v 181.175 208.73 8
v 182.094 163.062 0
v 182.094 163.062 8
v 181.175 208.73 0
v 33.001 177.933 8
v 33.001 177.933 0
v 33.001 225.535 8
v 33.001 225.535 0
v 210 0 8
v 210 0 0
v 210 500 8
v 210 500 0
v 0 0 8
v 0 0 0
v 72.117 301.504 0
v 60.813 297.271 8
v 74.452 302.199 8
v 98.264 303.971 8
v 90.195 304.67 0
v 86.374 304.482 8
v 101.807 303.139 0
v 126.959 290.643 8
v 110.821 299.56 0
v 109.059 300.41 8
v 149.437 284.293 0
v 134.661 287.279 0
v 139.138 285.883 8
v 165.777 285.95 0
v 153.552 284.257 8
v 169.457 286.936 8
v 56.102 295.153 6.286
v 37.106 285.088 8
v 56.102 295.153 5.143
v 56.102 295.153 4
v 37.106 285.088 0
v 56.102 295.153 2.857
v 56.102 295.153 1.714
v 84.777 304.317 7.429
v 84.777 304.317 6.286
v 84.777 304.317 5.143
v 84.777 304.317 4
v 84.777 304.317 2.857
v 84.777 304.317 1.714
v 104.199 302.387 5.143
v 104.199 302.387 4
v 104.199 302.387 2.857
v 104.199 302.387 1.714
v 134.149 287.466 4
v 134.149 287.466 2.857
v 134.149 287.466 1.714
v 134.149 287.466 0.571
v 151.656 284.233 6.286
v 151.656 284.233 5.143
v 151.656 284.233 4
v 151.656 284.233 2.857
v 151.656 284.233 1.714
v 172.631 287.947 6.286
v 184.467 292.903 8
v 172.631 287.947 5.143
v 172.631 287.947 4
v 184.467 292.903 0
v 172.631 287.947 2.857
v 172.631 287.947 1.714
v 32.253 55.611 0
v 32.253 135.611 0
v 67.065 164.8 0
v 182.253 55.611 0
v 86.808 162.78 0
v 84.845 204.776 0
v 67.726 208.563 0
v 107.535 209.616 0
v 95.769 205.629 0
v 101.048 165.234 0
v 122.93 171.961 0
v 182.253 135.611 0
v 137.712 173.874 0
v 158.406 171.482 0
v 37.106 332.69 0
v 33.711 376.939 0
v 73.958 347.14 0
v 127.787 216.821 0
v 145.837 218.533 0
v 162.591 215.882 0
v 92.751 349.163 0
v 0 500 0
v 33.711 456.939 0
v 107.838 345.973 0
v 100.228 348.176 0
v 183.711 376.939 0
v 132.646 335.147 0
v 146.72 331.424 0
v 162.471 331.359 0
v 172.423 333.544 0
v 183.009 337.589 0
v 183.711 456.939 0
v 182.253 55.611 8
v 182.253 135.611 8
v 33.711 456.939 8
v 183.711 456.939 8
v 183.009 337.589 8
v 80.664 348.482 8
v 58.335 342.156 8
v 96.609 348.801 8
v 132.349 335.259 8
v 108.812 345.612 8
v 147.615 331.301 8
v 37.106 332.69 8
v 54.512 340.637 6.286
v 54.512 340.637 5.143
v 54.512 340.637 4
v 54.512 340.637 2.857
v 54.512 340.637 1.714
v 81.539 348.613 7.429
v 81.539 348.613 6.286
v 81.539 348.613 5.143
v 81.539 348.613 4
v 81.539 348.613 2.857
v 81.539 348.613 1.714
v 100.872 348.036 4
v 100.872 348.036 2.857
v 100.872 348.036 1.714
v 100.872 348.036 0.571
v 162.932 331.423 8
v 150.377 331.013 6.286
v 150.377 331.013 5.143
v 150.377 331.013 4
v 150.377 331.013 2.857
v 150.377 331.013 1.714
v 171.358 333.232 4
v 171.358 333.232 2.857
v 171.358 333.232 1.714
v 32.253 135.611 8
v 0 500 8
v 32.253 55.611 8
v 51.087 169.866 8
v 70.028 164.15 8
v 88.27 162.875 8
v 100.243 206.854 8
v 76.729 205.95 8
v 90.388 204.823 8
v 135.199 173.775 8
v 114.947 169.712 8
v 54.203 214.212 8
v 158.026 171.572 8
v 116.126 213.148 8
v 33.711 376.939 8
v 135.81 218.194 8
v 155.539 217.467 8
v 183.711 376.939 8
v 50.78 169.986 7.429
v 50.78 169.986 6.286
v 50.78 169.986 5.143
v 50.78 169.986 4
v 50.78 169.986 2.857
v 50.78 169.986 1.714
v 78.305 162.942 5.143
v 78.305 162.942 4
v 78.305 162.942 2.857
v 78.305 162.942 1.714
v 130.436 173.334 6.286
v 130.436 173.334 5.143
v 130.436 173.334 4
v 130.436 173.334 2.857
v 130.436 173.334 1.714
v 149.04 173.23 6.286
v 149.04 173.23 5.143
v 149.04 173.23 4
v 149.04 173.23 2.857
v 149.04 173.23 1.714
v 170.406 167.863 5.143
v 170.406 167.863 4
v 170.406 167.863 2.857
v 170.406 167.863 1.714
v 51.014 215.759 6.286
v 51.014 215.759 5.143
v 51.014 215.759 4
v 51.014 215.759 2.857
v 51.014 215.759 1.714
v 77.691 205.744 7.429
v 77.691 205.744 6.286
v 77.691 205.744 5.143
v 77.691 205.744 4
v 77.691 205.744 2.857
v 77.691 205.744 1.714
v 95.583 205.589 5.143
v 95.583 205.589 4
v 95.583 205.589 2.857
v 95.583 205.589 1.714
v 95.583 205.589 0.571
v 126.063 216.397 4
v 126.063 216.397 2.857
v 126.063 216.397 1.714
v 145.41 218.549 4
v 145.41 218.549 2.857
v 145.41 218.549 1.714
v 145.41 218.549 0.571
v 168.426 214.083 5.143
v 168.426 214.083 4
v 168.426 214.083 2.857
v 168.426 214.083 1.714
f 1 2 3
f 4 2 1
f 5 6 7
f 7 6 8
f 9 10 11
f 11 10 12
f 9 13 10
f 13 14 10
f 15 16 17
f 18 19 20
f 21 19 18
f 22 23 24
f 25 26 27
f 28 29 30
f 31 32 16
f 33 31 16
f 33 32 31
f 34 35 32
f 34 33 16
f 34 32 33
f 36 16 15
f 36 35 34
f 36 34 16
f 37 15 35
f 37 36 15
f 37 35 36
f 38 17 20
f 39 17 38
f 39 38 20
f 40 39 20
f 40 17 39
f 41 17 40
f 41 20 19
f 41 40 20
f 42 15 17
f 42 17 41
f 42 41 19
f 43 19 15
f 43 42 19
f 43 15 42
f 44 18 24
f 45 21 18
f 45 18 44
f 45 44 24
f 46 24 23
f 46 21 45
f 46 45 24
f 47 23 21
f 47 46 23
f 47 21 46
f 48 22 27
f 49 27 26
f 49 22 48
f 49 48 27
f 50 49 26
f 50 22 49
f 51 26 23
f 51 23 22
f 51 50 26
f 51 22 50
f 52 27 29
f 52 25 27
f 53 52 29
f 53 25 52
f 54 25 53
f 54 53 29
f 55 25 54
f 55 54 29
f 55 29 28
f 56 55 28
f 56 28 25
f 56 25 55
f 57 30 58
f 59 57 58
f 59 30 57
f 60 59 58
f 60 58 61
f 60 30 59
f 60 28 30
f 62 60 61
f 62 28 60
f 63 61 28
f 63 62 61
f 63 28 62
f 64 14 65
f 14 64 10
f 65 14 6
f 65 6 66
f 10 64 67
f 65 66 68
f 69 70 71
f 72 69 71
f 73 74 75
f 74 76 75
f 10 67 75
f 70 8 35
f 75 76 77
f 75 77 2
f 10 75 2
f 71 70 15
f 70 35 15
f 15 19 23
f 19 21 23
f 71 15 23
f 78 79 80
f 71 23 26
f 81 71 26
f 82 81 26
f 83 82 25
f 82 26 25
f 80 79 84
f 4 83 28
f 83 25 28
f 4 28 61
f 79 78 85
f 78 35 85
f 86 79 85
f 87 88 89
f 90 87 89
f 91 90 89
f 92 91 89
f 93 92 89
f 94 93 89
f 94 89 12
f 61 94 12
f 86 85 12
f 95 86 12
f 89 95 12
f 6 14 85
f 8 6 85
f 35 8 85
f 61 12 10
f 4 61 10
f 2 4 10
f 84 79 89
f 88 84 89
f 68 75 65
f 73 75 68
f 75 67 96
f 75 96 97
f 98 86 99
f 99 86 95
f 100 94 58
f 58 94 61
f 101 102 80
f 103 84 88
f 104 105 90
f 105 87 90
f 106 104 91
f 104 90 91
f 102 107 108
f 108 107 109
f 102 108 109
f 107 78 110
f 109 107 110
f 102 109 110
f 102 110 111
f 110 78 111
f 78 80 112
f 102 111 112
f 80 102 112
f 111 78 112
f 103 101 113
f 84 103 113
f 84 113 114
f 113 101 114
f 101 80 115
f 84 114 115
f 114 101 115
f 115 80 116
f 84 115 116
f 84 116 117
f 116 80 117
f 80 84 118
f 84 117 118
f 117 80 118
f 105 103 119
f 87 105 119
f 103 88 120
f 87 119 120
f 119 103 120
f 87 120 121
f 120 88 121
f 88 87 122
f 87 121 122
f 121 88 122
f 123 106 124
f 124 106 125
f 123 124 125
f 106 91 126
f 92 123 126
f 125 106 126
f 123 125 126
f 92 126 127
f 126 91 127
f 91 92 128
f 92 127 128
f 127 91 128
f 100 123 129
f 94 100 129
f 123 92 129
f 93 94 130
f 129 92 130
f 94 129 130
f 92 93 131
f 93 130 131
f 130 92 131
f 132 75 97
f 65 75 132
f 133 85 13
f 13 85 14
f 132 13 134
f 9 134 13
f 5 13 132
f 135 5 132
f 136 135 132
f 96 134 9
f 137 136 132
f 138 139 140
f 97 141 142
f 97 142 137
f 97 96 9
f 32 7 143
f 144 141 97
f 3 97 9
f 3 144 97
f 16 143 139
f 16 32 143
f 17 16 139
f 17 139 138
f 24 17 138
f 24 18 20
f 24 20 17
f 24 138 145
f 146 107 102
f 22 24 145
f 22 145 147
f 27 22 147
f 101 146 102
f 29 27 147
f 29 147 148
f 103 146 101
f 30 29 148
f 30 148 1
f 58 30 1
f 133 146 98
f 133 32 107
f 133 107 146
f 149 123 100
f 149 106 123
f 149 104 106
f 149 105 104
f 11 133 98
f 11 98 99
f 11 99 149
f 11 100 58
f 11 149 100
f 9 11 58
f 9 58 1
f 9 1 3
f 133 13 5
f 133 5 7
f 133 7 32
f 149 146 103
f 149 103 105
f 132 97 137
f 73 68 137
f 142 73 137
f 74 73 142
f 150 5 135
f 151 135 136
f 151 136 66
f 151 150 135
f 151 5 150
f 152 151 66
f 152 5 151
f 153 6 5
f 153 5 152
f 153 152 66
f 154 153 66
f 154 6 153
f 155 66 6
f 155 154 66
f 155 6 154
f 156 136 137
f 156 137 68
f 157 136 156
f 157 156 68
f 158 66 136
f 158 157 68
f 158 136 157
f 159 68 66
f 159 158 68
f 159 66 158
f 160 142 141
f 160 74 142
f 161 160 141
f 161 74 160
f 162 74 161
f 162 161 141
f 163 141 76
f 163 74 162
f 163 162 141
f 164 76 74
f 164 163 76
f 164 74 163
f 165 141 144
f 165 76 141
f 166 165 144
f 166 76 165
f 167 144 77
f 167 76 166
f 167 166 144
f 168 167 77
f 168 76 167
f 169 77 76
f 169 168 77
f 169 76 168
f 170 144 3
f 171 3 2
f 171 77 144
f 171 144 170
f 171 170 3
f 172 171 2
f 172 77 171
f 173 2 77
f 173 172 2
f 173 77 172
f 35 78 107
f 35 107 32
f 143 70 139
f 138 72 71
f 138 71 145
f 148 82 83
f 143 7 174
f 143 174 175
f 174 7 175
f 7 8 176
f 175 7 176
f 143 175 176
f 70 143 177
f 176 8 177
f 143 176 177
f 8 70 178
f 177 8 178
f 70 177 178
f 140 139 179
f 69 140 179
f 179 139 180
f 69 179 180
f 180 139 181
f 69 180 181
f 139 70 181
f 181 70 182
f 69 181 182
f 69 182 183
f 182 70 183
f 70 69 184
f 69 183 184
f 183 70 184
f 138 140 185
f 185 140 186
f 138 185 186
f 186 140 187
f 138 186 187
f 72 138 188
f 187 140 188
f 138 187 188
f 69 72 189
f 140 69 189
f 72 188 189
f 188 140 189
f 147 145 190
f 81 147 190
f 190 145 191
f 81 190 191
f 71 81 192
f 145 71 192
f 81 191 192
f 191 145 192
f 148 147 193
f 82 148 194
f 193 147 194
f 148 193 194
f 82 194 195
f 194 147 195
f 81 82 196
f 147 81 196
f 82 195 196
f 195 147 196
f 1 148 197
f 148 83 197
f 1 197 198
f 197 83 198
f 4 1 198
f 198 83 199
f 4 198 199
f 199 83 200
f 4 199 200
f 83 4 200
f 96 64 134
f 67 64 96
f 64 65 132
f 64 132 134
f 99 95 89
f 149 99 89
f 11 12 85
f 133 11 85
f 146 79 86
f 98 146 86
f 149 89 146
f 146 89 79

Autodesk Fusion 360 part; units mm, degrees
sketch "Sketch1" plane through (0, 0, 0) normal (0, 0, 1) x (1, 0, 0)
  line L0 (0, 500) -> (0, 0)
  line L1 (0, 0) -> (210, 0)
  line L2 (210, 0) -> (210, 500)
  line L3 (210, 500) -> (0, 500)
  line L4 (210, 0) -> (210, 500)
  line L5 (420, 500) -> (420, 0)
  line L6 (210, 500) -> (420, 500)
  line L7 (420, 0) -> (210, 0)
  point P0 (420, 0)
  dimension "d1" = 210
  dimension "d2" = 500
sketch "Sketch2" plane through (0, 0, 0) normal (0, 0, 1) x (1, 0, 0)
  line L0 (33.711, 456.9389) -> (183.711, 456.9389)
  line L1 (183.711, 456.9389) -> (183.711, 376.9389)
  line L2 (183.711, 376.9389) -> (33.711, 376.9389)
  line L3 (33.711, 376.9389) -> (33.711, 456.9389)
  line L4 (210, 0) -> (210, 500)
  line L5 (236.289, 456.9389) -> (236.289, 376.9389)
  line L6 (236.289, 376.9389) -> (386.289, 376.9389)
  line L7 (386.289, 456.9389) -> (236.289, 456.9389)
  line L8 (386.289, 376.9389) -> (386.289, 456.9389)
  dimension "d5" = 80
  dimension "d6" = 150
sketch "Sketch3" plane through (0, 0, 0) normal (0, 0, 1) x (1, 0, 0)
  line L0 (32.2529, 55.6107) -> (182.2529, 55.6107)
  line L1 (182.2529, 55.6107) -> (182.2529, 135.6107)
  line L2 (182.2529, 135.6107) -> (32.2529, 135.6107)
  line L3 (32.2529, 135.6107) -> (32.2529, 55.6107)
  line L4 (210, 0) -> (210, 500)
  line L5 (237.7471, 55.6107) -> (237.7471, 135.6107)
  line L6 (387.7471, 135.6107) -> (387.7471, 55.6107)
  line L7 (237.7471, 135.6107) -> (387.7471, 135.6107)
  line L8 (387.7471, 55.6107) -> (237.7471, 55.6107)
  dimension "d3" = 80
  dimension "d4" = 150
sketch "Sketch4" plane through (0, 0, 0) normal (0, 0, 1) x (1, 0, 0)
  spline S0 degree 5 poles (37.1063, 332.6897) (42.3749, 335.3073) (52.3549, 339.9904) (65.6542, 345.3585) (80.2569, 349.3524) (94.455, 349.9181) (106.0588, 347.1834) (116.552, 342.4363) (127.2275, 337.0505) (138.9022, 332.4525) (151.9574, 330.0384) (163.6176, 330.8449) (173.049, 333.408) (179.6386, 336.0413) (183.0089, 337.5891) knots 0 0 0 0 0 0 0.1 0.2 0.3 0.4 0.5 0.6 0.7 0.8 0.9 1 1 1 1 1 1
  line L0 (12.8551, 320.6405) -> (61.3576, 344.7389)
  spline S1 degree 5 poles (37.1063, 285.0878) (42.8971, 288.4586) (53.8131, 294.4211) (68.19, 301.0281) (83.6155, 305.4358) (98.026, 305.1198) (109.2899, 300.9209) (119.1641, 294.9006) (129.1906, 289.0058) (140.3665, 284.7869) (153.15, 283.3608) (164.7942, 285.1007) (174.3242, 288.2578) (181.0276, 291.2129) (184.4668, 292.9031) knots 0 0 0 0 0 0 0.1 0.2 0.3 0.4 0.5 0.6 0.7 0.8 0.9 1 1 1 1 1 1
  line L1 (11.3971, 270.1228) -> (62.8155, 300.0529)
  line L2 (183.0089, 337.5891) -> (184.4668, 292.9031)
  line L3 (37.1063, 332.6897) -> (37.1063, 285.0878)
  spline S2 degree 5 poles (33.001, 177.9329) (38.3874, 175.2566) (48.5839, 170.5407) (62.1501, 165.3764) (77.0074, 162.0547) (91.4293, 162.4372) (103.2499, 165.5685) (114.0265, 169.6123) (125.0886, 172.9374) (137.2166, 174.4629) (150.704, 173.6089) (162.6105, 170.7864) (172.1303, 167.4148) (178.7303, 164.6061) (182.0937, 163.0615) knots 0 0 0 0 0 0 0.1 0.2 0.3 0.4 0.5 0.6 0.7 0.8 0.9 1 1 1 1 1 1
  line L4 (165.4289, 329.5156) -> (200.5889, 345.6626)
  line L5 (8.7497, 189.9821) -> (57.2522, 165.8837)
  line L6 (164.5136, 171.135) -> (199.6737, 154.988)
  line L7 (33.001, 177.9329) -> (33.001, 225.5347)
  spline S3 degree 5 poles (33.001, 225.5347) (38.5243, 222.3196) (48.8936, 216.5629) (62.4155, 209.9478) (76.6735, 204.9492) (89.8078, 203.8525) (100.2443, 206.3287) (109.9563, 210.6694) (120.5592, 215.2082) (132.869, 218.4944) (147.0982, 219.3055) (159.9368, 217.1832) (170.2893, 213.7191) (177.4957, 210.5385) (181.175, 208.7303) knots 0 0 0 0 0 0 0.1 0.2 0.3 0.4 0.5 0.6 0.7 0.8 0.9 1 1 1 1 1 1
  line L8 (166.2067, 283.9293) -> (202.727, 301.8769)
  line L9 (7.2917, 240.4998) -> (58.7102, 210.5696)
  line L10 (162.9149, 217.7041) -> (199.4352, 199.7565)
  line L11 (182.0937, 163.0615) -> (181.175, 208.7303)
  line L12 (210, 0) -> (210, 500)
  spline S4 degree 5 poles (382.8937, 332.6897) (377.6251, 335.3073) (367.6451, 339.9904) (354.3458, 345.3585) (339.7431, 349.3524) (325.545, 349.9181) (313.9412, 347.1834) (303.448, 342.4363) (292.7725, 337.0505) (281.0978, 332.4525) (268.0426, 330.0384) (256.3824, 330.8449) (246.951, 333.408) (240.3614, 336.0413) (236.9911, 337.5891) knots 0 0 0 0 0 0 0.1 0.2 0.3 0.4 0.5 0.6 0.7 0.8 0.9 1 1 1 1 1 1
  line L13 (407.1449, 320.6405) -> (358.6424, 344.7389)
  line L14 (254.5711, 329.5156) -> (219.4111, 345.6626)
  line L15 (382.8937, 332.6897) -> (382.8937, 285.0878)
  line L16 (237.9063, 163.0615) -> (238.825, 208.7303)
  line L17 (236.9911, 337.5891) -> (235.5332, 292.9031)
  spline S5 degree 5 poles (386.999, 177.9329) (381.6126, 175.2566) (371.4161, 170.5407) (357.8499, 165.3764) (342.9926, 162.0547) (328.5707, 162.4372) (316.7501, 165.5685) (305.9735, 169.6123) (294.9114, 172.9374) (282.7834, 174.4629) (269.296, 173.6089) (257.3895, 170.7864) (247.8697, 167.4148) (241.2697, 164.6061) (237.9063, 163.0615) knots 0 0 0 0 0 0 0.1 0.2 0.3 0.4 0.5 0.6 0.7 0.8 0.9 1 1 1 1 1 1
  line L18 (411.2503, 189.9821) -> (362.7478, 165.8837)
  line L19 (255.4864, 171.135) -> (220.3263, 154.988)
  spline S6 degree 5 poles (386.999, 225.5347) (381.4757, 222.3196) (371.1064, 216.5629) (357.5845, 209.9478) (343.3265, 204.9492) (330.1922, 203.8525) (319.7557, 206.3287) (310.0437, 210.6694) (299.4408, 215.2082) (287.131, 218.4944) (272.9018, 219.3055) (260.0632, 217.1832) (249.7107, 213.7191) (242.5043, 210.5385) (238.825, 208.7303) knots 0 0 0 0 0 0 0.1 0.2 0.3 0.4 0.5 0.6 0.7 0.8 0.9 1 1 1 1 1 1
  line L20 (412.7083, 240.4998) -> (361.2898, 210.5696)
  line L21 (257.0851, 217.7041) -> (220.5648, 199.7565)
  spline S7 degree 5 poles (382.8937, 285.0878) (377.1029, 288.4586) (366.1869, 294.4211) (351.81, 301.0281) (336.3845, 305.4358) (321.974, 305.1198) (310.7101, 300.9209) (300.8359, 294.9006) (290.8094, 289.0058) (279.6335, 284.7869) (266.85, 283.3608) (255.2058, 285.1007) (245.6758, 288.2578) (238.9724, 291.2129) (235.5332, 292.9031) knots 0 0 0 0 0 0 0.1 0.2 0.3 0.4 0.5 0.6 0.7 0.8 0.9 1 1 1 1 1 1
  line L22 (408.6029, 270.1228) -> (357.1845, 300.0529)
  line L23 (253.7933, 283.9293) -> (217.273, 301.8769)
  line L24 (386.999, 177.9329) -> (386.999, 225.5347)
  point P0 (120.393, 340.4922)
  point P1 (123.6058, 292.4233)
  point P2 (117.8255, 170.5984)
  point P3 (112.0744, 211.5163)
  point P4 (307.9256, 211.5163)
  point P5 (299.607, 340.4922)
  point P6 (302.1745, 170.5984)
  point P7 (296.3942, 292.4233)
sketch "Sketch5" plane through (0, 0, 0) normal (0, 0, 1) x (1, 0, 0)
  line L0 (36.9414, 334.4826) -> (36.9414, 288.2338)
sketch "Sketch6" plane through (0, 0, 0) normal (0, 0, 1) x (1, 0, 0)
  line L0 (182.7332, 343.5551) -> (182.7332, 300.0101)
  line L1 (210, 0) -> (210, 500)
  line L2 (237.2668, 343.5551) -> (237.2668, 300.0101)
extrude "Extrude1" add sketch "Sketch1" along normal blind 8 contours L0 L1 L2 L3 L4
extrude "Extrude2" cut sketch "Sketch4" along normal blind 50 contours S2 L7 S3 L11
extrude "Extrude3" cut sketch "Sketch3" along normal blind 50 contours L0 L1 L2 L3
extrude "Extrude4" cut sketch "Sketch2" along normal blind 50 contours L0 L1 L2 L3
extrude "Extrude5" cut sketch "Sketch4" along normal blind 20 contours S0 S1 L2 L3
